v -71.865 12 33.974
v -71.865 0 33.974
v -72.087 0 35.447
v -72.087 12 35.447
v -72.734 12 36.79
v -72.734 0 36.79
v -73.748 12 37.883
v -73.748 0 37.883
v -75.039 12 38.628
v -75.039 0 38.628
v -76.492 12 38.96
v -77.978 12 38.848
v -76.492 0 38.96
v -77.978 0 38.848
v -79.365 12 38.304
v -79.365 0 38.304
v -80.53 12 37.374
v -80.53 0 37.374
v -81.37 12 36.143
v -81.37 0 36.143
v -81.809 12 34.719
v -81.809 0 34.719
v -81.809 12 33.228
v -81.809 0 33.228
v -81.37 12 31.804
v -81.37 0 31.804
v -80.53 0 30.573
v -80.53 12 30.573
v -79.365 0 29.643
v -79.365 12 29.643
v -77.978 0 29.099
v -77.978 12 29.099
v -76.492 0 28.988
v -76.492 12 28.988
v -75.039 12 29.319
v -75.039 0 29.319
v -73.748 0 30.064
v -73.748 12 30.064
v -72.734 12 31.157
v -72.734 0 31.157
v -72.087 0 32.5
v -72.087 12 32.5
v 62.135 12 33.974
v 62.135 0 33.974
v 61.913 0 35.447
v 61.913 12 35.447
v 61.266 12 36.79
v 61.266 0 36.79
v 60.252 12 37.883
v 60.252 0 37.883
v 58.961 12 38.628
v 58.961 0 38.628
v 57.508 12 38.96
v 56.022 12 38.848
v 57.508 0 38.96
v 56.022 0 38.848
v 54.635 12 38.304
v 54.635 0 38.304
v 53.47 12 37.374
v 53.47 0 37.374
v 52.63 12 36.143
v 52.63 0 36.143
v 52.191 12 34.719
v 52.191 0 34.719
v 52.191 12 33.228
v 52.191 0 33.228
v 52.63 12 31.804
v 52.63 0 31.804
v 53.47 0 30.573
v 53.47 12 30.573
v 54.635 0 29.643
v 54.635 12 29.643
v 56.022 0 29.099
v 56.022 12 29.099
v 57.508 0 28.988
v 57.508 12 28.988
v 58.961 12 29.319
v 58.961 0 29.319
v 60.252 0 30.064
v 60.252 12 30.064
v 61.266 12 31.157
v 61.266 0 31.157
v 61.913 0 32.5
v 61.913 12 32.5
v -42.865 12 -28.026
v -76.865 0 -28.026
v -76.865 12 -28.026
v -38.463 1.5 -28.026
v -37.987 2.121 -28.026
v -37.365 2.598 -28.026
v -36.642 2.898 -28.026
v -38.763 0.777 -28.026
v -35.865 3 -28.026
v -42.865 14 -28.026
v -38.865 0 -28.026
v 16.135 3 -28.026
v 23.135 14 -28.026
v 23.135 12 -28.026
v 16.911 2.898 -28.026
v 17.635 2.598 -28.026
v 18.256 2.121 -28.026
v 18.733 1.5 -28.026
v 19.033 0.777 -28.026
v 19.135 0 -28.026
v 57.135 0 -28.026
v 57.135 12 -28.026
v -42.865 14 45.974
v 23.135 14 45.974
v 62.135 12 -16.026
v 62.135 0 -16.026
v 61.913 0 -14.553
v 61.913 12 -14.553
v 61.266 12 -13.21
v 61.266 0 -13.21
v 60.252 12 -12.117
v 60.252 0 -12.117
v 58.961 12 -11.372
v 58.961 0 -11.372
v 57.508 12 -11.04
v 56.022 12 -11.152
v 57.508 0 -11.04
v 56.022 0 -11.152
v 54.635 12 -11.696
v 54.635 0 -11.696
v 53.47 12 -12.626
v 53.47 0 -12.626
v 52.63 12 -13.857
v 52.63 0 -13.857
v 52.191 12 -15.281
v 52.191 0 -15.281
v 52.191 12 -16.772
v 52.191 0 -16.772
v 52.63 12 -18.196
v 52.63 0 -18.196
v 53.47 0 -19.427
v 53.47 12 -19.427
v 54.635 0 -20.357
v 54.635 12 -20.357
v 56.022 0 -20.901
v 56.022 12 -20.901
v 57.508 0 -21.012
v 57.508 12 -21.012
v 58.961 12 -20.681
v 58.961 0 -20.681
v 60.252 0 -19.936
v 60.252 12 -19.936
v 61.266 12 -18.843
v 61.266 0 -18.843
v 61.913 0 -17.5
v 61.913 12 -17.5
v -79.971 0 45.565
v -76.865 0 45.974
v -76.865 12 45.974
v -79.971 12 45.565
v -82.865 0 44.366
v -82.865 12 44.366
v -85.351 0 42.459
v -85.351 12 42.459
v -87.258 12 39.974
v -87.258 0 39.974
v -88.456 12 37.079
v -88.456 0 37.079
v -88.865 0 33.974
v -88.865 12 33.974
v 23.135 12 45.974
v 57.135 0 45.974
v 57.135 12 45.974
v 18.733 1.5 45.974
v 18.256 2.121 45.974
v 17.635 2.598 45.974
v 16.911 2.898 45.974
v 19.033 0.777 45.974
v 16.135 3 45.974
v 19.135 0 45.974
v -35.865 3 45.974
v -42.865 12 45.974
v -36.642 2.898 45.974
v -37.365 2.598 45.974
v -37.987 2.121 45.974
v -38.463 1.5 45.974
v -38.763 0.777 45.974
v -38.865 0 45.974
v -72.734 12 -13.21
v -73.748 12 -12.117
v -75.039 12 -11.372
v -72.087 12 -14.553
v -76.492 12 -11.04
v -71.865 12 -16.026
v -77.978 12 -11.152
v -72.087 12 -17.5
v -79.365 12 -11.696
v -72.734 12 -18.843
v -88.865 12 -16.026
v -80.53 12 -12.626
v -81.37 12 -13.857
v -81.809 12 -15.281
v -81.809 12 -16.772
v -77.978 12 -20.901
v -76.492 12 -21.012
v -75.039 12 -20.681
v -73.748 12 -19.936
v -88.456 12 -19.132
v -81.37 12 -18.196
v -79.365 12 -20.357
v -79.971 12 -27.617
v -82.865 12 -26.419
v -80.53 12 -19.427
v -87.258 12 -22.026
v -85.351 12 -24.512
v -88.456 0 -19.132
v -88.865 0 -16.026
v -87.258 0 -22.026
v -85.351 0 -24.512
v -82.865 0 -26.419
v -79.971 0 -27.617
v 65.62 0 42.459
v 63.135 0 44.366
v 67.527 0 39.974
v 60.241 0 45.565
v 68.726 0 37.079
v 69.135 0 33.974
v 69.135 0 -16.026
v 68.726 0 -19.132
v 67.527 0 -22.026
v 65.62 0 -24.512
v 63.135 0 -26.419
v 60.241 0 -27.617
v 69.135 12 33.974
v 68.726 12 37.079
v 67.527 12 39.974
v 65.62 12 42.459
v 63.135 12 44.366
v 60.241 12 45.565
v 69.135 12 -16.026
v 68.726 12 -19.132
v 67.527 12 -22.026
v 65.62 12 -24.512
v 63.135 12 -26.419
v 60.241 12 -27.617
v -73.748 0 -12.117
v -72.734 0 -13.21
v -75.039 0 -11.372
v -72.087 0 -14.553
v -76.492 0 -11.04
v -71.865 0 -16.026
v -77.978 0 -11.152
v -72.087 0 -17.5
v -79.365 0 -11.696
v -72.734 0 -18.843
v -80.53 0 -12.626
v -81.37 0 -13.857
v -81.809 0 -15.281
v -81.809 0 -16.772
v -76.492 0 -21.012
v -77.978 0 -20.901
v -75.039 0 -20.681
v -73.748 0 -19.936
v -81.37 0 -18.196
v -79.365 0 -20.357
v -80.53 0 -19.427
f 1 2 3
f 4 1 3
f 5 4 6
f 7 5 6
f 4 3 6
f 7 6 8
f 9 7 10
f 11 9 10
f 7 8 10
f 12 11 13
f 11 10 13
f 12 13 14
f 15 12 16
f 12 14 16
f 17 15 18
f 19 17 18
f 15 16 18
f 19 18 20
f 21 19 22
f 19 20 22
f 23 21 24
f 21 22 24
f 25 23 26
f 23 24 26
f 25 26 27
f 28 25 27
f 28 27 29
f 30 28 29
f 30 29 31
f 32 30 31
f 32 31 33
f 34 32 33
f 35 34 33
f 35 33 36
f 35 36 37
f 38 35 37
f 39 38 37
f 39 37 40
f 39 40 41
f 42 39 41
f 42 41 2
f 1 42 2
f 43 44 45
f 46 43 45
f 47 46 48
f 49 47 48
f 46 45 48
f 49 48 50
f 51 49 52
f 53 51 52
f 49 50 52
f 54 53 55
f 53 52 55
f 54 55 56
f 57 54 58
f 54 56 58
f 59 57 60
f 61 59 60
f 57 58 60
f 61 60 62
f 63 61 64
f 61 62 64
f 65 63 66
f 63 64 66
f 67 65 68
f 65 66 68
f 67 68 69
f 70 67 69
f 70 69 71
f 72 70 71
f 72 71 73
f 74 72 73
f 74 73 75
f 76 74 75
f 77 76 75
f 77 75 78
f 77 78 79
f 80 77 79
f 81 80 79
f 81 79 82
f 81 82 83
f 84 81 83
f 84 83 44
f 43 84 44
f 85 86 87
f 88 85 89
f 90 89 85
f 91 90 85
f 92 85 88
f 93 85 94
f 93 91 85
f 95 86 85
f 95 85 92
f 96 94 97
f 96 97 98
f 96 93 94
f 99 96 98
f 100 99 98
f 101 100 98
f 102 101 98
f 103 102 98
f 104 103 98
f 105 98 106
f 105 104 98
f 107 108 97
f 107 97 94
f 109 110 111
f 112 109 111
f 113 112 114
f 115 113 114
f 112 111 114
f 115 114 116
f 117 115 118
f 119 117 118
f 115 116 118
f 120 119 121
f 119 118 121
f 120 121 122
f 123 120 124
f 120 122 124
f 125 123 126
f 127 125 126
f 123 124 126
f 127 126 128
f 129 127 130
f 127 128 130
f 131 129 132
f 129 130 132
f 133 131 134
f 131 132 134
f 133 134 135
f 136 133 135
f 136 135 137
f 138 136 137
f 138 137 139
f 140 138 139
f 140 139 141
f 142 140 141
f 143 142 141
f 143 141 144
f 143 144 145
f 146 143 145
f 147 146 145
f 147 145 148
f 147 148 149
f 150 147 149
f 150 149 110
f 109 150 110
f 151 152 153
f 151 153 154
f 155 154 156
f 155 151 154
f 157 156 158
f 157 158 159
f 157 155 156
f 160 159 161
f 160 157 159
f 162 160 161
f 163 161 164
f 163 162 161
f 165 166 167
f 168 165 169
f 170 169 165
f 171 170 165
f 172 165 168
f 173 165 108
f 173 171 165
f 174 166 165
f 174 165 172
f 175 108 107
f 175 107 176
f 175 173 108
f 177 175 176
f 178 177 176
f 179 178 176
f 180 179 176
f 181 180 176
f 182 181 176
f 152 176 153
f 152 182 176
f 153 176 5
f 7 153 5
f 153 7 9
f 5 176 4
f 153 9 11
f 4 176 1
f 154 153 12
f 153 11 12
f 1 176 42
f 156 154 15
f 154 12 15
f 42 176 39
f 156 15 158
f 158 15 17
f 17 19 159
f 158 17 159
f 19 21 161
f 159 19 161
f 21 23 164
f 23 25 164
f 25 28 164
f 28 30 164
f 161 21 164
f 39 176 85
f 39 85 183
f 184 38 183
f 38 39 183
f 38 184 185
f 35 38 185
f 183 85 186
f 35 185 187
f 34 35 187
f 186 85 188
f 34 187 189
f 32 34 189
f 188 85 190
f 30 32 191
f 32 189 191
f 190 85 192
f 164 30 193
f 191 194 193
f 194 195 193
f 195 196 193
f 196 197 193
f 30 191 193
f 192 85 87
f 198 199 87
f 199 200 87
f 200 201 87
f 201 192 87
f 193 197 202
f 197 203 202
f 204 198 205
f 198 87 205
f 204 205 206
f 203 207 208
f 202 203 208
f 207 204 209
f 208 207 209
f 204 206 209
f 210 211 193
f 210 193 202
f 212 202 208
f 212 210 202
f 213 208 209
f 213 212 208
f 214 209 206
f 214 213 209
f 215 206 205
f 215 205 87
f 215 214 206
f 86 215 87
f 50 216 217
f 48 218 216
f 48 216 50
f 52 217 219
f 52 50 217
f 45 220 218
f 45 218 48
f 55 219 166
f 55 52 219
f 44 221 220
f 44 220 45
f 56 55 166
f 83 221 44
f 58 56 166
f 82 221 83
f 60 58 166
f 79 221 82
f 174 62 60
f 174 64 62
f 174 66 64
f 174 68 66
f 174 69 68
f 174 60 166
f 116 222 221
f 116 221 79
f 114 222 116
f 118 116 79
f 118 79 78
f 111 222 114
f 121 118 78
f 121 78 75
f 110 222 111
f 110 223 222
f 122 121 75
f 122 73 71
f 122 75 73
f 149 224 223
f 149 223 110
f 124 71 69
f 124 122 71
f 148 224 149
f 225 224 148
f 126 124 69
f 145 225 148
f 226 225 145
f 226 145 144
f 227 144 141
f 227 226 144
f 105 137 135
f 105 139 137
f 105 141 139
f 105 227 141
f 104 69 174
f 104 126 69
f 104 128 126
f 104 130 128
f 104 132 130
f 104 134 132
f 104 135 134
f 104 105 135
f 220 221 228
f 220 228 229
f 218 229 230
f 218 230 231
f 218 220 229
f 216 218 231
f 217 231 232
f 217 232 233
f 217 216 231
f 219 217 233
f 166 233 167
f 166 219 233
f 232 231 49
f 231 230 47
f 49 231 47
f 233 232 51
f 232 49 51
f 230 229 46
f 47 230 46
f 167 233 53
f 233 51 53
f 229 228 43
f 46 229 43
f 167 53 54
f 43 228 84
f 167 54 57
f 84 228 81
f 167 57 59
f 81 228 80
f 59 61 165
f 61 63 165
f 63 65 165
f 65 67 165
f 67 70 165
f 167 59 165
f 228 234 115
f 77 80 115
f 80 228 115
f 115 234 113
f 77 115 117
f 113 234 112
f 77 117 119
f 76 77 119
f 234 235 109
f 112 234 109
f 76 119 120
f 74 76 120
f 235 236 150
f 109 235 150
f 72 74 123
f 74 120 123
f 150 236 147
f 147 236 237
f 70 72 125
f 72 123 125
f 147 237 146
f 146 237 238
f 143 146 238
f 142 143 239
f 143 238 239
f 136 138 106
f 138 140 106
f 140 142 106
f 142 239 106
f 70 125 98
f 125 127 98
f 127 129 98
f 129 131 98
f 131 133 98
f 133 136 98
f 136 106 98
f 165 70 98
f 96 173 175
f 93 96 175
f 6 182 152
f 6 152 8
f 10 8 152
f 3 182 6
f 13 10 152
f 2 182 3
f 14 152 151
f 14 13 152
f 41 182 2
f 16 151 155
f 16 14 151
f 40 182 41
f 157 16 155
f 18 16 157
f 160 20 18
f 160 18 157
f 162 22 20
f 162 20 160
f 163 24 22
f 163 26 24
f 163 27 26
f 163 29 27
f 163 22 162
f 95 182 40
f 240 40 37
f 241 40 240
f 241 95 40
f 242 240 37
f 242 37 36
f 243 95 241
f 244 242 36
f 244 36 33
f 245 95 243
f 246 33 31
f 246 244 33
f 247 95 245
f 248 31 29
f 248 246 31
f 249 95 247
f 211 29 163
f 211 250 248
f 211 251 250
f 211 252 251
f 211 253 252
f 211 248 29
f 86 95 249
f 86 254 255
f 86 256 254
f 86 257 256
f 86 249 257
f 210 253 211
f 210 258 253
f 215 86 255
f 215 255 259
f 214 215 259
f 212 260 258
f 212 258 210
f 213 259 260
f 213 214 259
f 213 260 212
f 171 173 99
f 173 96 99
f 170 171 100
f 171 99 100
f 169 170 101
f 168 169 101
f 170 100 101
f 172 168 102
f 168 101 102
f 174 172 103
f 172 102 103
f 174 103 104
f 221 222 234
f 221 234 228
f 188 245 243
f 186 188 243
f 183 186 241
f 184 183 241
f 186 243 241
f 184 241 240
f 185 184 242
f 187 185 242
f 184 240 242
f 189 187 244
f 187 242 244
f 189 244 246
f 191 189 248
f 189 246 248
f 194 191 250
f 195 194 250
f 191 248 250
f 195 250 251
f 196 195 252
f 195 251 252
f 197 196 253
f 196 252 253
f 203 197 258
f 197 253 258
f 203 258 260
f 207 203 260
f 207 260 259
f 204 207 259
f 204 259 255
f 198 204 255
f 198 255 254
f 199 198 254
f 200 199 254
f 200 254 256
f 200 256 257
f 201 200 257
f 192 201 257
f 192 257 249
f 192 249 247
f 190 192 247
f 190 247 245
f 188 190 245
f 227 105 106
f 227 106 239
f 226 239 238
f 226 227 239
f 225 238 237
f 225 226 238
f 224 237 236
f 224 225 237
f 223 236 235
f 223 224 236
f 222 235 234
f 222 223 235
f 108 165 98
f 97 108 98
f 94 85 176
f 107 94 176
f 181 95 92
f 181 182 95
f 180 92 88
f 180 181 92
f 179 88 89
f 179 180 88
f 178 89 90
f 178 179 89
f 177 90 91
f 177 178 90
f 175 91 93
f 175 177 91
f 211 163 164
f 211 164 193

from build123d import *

# Parameters (mm, degrees)
BOSS_EXTRUDE1_DEPTH = 12
BOSS_EXTRUDE2_DEPTH = 2
CUT_EXTRUDE1_DEPTH  = 3
FILLET1_R           = 3
FILLET2_R           = 3
HOLE2_D             = 10
HOLE3_D             = 10
HOLE4_D             = 10
HOLE5_D             = 10


with BuildPart() as part:
    # Sketch1 → Boss-Extrude1 (new body)
    with BuildSketch(Plane(origin=(0, 0, 0), x_dir=(1, 0, 0), z_dir=(0, 1, 0))):
        with BuildLine():
            Line((-76.865222767, 28.026373193), (57.134777233, 28.026373193))
            ThreePointArc((57.134777233, 28.026373193), (65.620058607, 24.511654567), (69.134777233, 16.026373193))
            Line((69.134777233, 16.026373193), (69.134777233, -33.973626807))
            ThreePointArc((69.134777233, -33.973626807), (65.620058607, -42.458908182), (57.134777233, -45.973626807))
            Line((57.134777233, -45.973626807), (-76.865222767, -45.973626807))
            ThreePointArc((-76.865222767, -45.973626807), (-85.350504141, -42.458908182), (-88.865222767, -33.973626807))
            Line((-88.865222767, -33.973626807), (-88.865222767, 16.026373193))
            ThreePointArc((-88.865222767, 16.026373193), (-85.350504141, 24.511654567), (-76.865222767, 28.026373193))
        make_face()
    extrude(amount=BOSS_EXTRUDE1_DEPTH)

    # Sketch2 → Boss-Extrude2 (add)
    with BuildSketch(Plane(origin=(0, 12, 0), x_dir=(-1, 0, 0), z_dir=(0, 1, 0))):
        Polygon((9.865222767, -28.026373193), (42.865222767, -28.026373193), (42.865222767, 45.973626807), (-23.134777233, 45.973626807), (-23.134777233, -28.026373193), align=None)
    extrude(amount=BOSS_EXTRUDE2_DEPTH)

    # Sketch3 → Cut-Extrude1 (cut)
    with BuildSketch(Plane.XZ):
        Polygon((-9.865222767, 45.973626807), (19.134777233, 45.973626807), (19.134777233, -28.026373193), (-38.865222767, -28.026373193), (-38.865222767, 45.973626807), align=None)
    extrude(amount=-CUT_EXTRUDE1_DEPTH, mode=Mode.SUBTRACT)

    # Fillet1
    fillet1_edges = [part.edges().sort_by_distance(p)[0] for p in [
        (-38.865222767, 3, 8.973626807),
    ]]
    fillet(fillet1_edges, radius=FILLET1_R - 0.0001)  # a hair under: the kernel refuses the full size

    # Fillet2
    fillet2_edges = [part.edges().sort_by_distance(p)[0] for p in [
        (19.134777233, 3, 8.973626807),
    ]]
    fillet(fillet2_edges, radius=FILLET2_R - 0.0001)  # a hair under: the kernel refuses the full size

    # Hole2 (through all)
    with Locations(Plane(origin=(0, 12, 0), x_dir=(-1, 0, 0), z_dir=(0, 1, 0))):
        with Locations((76.865222767, -16.026373193)):
            Hole(HOLE2_D / 2)

    # Hole3 (through all)
    with Locations(Plane(origin=(0, 12, 0), x_dir=(-1, 0, 0), z_dir=(0, 1, 0))):
        with Locations((76.865222767, 33.973626807)):
            Hole(HOLE3_D / 2)

    # Hole4 (through all)
    with Locations(Plane(origin=(0, 12, 0), x_dir=(-1, 0, 0), z_dir=(0, 1, 0))):
        with Locations((-57.134777233, 33.973626807)):
            Hole(HOLE4_D / 2)

    # Hole5 (through all)
    with Locations(Plane(origin=(0, 12, 0), x_dir=(-1, 0, 0), z_dir=(0, 1, 0))):
        with Locations((-57.134777233, -16.026373193)):
            Hole(HOLE5_D / 2)


solid = part.part
